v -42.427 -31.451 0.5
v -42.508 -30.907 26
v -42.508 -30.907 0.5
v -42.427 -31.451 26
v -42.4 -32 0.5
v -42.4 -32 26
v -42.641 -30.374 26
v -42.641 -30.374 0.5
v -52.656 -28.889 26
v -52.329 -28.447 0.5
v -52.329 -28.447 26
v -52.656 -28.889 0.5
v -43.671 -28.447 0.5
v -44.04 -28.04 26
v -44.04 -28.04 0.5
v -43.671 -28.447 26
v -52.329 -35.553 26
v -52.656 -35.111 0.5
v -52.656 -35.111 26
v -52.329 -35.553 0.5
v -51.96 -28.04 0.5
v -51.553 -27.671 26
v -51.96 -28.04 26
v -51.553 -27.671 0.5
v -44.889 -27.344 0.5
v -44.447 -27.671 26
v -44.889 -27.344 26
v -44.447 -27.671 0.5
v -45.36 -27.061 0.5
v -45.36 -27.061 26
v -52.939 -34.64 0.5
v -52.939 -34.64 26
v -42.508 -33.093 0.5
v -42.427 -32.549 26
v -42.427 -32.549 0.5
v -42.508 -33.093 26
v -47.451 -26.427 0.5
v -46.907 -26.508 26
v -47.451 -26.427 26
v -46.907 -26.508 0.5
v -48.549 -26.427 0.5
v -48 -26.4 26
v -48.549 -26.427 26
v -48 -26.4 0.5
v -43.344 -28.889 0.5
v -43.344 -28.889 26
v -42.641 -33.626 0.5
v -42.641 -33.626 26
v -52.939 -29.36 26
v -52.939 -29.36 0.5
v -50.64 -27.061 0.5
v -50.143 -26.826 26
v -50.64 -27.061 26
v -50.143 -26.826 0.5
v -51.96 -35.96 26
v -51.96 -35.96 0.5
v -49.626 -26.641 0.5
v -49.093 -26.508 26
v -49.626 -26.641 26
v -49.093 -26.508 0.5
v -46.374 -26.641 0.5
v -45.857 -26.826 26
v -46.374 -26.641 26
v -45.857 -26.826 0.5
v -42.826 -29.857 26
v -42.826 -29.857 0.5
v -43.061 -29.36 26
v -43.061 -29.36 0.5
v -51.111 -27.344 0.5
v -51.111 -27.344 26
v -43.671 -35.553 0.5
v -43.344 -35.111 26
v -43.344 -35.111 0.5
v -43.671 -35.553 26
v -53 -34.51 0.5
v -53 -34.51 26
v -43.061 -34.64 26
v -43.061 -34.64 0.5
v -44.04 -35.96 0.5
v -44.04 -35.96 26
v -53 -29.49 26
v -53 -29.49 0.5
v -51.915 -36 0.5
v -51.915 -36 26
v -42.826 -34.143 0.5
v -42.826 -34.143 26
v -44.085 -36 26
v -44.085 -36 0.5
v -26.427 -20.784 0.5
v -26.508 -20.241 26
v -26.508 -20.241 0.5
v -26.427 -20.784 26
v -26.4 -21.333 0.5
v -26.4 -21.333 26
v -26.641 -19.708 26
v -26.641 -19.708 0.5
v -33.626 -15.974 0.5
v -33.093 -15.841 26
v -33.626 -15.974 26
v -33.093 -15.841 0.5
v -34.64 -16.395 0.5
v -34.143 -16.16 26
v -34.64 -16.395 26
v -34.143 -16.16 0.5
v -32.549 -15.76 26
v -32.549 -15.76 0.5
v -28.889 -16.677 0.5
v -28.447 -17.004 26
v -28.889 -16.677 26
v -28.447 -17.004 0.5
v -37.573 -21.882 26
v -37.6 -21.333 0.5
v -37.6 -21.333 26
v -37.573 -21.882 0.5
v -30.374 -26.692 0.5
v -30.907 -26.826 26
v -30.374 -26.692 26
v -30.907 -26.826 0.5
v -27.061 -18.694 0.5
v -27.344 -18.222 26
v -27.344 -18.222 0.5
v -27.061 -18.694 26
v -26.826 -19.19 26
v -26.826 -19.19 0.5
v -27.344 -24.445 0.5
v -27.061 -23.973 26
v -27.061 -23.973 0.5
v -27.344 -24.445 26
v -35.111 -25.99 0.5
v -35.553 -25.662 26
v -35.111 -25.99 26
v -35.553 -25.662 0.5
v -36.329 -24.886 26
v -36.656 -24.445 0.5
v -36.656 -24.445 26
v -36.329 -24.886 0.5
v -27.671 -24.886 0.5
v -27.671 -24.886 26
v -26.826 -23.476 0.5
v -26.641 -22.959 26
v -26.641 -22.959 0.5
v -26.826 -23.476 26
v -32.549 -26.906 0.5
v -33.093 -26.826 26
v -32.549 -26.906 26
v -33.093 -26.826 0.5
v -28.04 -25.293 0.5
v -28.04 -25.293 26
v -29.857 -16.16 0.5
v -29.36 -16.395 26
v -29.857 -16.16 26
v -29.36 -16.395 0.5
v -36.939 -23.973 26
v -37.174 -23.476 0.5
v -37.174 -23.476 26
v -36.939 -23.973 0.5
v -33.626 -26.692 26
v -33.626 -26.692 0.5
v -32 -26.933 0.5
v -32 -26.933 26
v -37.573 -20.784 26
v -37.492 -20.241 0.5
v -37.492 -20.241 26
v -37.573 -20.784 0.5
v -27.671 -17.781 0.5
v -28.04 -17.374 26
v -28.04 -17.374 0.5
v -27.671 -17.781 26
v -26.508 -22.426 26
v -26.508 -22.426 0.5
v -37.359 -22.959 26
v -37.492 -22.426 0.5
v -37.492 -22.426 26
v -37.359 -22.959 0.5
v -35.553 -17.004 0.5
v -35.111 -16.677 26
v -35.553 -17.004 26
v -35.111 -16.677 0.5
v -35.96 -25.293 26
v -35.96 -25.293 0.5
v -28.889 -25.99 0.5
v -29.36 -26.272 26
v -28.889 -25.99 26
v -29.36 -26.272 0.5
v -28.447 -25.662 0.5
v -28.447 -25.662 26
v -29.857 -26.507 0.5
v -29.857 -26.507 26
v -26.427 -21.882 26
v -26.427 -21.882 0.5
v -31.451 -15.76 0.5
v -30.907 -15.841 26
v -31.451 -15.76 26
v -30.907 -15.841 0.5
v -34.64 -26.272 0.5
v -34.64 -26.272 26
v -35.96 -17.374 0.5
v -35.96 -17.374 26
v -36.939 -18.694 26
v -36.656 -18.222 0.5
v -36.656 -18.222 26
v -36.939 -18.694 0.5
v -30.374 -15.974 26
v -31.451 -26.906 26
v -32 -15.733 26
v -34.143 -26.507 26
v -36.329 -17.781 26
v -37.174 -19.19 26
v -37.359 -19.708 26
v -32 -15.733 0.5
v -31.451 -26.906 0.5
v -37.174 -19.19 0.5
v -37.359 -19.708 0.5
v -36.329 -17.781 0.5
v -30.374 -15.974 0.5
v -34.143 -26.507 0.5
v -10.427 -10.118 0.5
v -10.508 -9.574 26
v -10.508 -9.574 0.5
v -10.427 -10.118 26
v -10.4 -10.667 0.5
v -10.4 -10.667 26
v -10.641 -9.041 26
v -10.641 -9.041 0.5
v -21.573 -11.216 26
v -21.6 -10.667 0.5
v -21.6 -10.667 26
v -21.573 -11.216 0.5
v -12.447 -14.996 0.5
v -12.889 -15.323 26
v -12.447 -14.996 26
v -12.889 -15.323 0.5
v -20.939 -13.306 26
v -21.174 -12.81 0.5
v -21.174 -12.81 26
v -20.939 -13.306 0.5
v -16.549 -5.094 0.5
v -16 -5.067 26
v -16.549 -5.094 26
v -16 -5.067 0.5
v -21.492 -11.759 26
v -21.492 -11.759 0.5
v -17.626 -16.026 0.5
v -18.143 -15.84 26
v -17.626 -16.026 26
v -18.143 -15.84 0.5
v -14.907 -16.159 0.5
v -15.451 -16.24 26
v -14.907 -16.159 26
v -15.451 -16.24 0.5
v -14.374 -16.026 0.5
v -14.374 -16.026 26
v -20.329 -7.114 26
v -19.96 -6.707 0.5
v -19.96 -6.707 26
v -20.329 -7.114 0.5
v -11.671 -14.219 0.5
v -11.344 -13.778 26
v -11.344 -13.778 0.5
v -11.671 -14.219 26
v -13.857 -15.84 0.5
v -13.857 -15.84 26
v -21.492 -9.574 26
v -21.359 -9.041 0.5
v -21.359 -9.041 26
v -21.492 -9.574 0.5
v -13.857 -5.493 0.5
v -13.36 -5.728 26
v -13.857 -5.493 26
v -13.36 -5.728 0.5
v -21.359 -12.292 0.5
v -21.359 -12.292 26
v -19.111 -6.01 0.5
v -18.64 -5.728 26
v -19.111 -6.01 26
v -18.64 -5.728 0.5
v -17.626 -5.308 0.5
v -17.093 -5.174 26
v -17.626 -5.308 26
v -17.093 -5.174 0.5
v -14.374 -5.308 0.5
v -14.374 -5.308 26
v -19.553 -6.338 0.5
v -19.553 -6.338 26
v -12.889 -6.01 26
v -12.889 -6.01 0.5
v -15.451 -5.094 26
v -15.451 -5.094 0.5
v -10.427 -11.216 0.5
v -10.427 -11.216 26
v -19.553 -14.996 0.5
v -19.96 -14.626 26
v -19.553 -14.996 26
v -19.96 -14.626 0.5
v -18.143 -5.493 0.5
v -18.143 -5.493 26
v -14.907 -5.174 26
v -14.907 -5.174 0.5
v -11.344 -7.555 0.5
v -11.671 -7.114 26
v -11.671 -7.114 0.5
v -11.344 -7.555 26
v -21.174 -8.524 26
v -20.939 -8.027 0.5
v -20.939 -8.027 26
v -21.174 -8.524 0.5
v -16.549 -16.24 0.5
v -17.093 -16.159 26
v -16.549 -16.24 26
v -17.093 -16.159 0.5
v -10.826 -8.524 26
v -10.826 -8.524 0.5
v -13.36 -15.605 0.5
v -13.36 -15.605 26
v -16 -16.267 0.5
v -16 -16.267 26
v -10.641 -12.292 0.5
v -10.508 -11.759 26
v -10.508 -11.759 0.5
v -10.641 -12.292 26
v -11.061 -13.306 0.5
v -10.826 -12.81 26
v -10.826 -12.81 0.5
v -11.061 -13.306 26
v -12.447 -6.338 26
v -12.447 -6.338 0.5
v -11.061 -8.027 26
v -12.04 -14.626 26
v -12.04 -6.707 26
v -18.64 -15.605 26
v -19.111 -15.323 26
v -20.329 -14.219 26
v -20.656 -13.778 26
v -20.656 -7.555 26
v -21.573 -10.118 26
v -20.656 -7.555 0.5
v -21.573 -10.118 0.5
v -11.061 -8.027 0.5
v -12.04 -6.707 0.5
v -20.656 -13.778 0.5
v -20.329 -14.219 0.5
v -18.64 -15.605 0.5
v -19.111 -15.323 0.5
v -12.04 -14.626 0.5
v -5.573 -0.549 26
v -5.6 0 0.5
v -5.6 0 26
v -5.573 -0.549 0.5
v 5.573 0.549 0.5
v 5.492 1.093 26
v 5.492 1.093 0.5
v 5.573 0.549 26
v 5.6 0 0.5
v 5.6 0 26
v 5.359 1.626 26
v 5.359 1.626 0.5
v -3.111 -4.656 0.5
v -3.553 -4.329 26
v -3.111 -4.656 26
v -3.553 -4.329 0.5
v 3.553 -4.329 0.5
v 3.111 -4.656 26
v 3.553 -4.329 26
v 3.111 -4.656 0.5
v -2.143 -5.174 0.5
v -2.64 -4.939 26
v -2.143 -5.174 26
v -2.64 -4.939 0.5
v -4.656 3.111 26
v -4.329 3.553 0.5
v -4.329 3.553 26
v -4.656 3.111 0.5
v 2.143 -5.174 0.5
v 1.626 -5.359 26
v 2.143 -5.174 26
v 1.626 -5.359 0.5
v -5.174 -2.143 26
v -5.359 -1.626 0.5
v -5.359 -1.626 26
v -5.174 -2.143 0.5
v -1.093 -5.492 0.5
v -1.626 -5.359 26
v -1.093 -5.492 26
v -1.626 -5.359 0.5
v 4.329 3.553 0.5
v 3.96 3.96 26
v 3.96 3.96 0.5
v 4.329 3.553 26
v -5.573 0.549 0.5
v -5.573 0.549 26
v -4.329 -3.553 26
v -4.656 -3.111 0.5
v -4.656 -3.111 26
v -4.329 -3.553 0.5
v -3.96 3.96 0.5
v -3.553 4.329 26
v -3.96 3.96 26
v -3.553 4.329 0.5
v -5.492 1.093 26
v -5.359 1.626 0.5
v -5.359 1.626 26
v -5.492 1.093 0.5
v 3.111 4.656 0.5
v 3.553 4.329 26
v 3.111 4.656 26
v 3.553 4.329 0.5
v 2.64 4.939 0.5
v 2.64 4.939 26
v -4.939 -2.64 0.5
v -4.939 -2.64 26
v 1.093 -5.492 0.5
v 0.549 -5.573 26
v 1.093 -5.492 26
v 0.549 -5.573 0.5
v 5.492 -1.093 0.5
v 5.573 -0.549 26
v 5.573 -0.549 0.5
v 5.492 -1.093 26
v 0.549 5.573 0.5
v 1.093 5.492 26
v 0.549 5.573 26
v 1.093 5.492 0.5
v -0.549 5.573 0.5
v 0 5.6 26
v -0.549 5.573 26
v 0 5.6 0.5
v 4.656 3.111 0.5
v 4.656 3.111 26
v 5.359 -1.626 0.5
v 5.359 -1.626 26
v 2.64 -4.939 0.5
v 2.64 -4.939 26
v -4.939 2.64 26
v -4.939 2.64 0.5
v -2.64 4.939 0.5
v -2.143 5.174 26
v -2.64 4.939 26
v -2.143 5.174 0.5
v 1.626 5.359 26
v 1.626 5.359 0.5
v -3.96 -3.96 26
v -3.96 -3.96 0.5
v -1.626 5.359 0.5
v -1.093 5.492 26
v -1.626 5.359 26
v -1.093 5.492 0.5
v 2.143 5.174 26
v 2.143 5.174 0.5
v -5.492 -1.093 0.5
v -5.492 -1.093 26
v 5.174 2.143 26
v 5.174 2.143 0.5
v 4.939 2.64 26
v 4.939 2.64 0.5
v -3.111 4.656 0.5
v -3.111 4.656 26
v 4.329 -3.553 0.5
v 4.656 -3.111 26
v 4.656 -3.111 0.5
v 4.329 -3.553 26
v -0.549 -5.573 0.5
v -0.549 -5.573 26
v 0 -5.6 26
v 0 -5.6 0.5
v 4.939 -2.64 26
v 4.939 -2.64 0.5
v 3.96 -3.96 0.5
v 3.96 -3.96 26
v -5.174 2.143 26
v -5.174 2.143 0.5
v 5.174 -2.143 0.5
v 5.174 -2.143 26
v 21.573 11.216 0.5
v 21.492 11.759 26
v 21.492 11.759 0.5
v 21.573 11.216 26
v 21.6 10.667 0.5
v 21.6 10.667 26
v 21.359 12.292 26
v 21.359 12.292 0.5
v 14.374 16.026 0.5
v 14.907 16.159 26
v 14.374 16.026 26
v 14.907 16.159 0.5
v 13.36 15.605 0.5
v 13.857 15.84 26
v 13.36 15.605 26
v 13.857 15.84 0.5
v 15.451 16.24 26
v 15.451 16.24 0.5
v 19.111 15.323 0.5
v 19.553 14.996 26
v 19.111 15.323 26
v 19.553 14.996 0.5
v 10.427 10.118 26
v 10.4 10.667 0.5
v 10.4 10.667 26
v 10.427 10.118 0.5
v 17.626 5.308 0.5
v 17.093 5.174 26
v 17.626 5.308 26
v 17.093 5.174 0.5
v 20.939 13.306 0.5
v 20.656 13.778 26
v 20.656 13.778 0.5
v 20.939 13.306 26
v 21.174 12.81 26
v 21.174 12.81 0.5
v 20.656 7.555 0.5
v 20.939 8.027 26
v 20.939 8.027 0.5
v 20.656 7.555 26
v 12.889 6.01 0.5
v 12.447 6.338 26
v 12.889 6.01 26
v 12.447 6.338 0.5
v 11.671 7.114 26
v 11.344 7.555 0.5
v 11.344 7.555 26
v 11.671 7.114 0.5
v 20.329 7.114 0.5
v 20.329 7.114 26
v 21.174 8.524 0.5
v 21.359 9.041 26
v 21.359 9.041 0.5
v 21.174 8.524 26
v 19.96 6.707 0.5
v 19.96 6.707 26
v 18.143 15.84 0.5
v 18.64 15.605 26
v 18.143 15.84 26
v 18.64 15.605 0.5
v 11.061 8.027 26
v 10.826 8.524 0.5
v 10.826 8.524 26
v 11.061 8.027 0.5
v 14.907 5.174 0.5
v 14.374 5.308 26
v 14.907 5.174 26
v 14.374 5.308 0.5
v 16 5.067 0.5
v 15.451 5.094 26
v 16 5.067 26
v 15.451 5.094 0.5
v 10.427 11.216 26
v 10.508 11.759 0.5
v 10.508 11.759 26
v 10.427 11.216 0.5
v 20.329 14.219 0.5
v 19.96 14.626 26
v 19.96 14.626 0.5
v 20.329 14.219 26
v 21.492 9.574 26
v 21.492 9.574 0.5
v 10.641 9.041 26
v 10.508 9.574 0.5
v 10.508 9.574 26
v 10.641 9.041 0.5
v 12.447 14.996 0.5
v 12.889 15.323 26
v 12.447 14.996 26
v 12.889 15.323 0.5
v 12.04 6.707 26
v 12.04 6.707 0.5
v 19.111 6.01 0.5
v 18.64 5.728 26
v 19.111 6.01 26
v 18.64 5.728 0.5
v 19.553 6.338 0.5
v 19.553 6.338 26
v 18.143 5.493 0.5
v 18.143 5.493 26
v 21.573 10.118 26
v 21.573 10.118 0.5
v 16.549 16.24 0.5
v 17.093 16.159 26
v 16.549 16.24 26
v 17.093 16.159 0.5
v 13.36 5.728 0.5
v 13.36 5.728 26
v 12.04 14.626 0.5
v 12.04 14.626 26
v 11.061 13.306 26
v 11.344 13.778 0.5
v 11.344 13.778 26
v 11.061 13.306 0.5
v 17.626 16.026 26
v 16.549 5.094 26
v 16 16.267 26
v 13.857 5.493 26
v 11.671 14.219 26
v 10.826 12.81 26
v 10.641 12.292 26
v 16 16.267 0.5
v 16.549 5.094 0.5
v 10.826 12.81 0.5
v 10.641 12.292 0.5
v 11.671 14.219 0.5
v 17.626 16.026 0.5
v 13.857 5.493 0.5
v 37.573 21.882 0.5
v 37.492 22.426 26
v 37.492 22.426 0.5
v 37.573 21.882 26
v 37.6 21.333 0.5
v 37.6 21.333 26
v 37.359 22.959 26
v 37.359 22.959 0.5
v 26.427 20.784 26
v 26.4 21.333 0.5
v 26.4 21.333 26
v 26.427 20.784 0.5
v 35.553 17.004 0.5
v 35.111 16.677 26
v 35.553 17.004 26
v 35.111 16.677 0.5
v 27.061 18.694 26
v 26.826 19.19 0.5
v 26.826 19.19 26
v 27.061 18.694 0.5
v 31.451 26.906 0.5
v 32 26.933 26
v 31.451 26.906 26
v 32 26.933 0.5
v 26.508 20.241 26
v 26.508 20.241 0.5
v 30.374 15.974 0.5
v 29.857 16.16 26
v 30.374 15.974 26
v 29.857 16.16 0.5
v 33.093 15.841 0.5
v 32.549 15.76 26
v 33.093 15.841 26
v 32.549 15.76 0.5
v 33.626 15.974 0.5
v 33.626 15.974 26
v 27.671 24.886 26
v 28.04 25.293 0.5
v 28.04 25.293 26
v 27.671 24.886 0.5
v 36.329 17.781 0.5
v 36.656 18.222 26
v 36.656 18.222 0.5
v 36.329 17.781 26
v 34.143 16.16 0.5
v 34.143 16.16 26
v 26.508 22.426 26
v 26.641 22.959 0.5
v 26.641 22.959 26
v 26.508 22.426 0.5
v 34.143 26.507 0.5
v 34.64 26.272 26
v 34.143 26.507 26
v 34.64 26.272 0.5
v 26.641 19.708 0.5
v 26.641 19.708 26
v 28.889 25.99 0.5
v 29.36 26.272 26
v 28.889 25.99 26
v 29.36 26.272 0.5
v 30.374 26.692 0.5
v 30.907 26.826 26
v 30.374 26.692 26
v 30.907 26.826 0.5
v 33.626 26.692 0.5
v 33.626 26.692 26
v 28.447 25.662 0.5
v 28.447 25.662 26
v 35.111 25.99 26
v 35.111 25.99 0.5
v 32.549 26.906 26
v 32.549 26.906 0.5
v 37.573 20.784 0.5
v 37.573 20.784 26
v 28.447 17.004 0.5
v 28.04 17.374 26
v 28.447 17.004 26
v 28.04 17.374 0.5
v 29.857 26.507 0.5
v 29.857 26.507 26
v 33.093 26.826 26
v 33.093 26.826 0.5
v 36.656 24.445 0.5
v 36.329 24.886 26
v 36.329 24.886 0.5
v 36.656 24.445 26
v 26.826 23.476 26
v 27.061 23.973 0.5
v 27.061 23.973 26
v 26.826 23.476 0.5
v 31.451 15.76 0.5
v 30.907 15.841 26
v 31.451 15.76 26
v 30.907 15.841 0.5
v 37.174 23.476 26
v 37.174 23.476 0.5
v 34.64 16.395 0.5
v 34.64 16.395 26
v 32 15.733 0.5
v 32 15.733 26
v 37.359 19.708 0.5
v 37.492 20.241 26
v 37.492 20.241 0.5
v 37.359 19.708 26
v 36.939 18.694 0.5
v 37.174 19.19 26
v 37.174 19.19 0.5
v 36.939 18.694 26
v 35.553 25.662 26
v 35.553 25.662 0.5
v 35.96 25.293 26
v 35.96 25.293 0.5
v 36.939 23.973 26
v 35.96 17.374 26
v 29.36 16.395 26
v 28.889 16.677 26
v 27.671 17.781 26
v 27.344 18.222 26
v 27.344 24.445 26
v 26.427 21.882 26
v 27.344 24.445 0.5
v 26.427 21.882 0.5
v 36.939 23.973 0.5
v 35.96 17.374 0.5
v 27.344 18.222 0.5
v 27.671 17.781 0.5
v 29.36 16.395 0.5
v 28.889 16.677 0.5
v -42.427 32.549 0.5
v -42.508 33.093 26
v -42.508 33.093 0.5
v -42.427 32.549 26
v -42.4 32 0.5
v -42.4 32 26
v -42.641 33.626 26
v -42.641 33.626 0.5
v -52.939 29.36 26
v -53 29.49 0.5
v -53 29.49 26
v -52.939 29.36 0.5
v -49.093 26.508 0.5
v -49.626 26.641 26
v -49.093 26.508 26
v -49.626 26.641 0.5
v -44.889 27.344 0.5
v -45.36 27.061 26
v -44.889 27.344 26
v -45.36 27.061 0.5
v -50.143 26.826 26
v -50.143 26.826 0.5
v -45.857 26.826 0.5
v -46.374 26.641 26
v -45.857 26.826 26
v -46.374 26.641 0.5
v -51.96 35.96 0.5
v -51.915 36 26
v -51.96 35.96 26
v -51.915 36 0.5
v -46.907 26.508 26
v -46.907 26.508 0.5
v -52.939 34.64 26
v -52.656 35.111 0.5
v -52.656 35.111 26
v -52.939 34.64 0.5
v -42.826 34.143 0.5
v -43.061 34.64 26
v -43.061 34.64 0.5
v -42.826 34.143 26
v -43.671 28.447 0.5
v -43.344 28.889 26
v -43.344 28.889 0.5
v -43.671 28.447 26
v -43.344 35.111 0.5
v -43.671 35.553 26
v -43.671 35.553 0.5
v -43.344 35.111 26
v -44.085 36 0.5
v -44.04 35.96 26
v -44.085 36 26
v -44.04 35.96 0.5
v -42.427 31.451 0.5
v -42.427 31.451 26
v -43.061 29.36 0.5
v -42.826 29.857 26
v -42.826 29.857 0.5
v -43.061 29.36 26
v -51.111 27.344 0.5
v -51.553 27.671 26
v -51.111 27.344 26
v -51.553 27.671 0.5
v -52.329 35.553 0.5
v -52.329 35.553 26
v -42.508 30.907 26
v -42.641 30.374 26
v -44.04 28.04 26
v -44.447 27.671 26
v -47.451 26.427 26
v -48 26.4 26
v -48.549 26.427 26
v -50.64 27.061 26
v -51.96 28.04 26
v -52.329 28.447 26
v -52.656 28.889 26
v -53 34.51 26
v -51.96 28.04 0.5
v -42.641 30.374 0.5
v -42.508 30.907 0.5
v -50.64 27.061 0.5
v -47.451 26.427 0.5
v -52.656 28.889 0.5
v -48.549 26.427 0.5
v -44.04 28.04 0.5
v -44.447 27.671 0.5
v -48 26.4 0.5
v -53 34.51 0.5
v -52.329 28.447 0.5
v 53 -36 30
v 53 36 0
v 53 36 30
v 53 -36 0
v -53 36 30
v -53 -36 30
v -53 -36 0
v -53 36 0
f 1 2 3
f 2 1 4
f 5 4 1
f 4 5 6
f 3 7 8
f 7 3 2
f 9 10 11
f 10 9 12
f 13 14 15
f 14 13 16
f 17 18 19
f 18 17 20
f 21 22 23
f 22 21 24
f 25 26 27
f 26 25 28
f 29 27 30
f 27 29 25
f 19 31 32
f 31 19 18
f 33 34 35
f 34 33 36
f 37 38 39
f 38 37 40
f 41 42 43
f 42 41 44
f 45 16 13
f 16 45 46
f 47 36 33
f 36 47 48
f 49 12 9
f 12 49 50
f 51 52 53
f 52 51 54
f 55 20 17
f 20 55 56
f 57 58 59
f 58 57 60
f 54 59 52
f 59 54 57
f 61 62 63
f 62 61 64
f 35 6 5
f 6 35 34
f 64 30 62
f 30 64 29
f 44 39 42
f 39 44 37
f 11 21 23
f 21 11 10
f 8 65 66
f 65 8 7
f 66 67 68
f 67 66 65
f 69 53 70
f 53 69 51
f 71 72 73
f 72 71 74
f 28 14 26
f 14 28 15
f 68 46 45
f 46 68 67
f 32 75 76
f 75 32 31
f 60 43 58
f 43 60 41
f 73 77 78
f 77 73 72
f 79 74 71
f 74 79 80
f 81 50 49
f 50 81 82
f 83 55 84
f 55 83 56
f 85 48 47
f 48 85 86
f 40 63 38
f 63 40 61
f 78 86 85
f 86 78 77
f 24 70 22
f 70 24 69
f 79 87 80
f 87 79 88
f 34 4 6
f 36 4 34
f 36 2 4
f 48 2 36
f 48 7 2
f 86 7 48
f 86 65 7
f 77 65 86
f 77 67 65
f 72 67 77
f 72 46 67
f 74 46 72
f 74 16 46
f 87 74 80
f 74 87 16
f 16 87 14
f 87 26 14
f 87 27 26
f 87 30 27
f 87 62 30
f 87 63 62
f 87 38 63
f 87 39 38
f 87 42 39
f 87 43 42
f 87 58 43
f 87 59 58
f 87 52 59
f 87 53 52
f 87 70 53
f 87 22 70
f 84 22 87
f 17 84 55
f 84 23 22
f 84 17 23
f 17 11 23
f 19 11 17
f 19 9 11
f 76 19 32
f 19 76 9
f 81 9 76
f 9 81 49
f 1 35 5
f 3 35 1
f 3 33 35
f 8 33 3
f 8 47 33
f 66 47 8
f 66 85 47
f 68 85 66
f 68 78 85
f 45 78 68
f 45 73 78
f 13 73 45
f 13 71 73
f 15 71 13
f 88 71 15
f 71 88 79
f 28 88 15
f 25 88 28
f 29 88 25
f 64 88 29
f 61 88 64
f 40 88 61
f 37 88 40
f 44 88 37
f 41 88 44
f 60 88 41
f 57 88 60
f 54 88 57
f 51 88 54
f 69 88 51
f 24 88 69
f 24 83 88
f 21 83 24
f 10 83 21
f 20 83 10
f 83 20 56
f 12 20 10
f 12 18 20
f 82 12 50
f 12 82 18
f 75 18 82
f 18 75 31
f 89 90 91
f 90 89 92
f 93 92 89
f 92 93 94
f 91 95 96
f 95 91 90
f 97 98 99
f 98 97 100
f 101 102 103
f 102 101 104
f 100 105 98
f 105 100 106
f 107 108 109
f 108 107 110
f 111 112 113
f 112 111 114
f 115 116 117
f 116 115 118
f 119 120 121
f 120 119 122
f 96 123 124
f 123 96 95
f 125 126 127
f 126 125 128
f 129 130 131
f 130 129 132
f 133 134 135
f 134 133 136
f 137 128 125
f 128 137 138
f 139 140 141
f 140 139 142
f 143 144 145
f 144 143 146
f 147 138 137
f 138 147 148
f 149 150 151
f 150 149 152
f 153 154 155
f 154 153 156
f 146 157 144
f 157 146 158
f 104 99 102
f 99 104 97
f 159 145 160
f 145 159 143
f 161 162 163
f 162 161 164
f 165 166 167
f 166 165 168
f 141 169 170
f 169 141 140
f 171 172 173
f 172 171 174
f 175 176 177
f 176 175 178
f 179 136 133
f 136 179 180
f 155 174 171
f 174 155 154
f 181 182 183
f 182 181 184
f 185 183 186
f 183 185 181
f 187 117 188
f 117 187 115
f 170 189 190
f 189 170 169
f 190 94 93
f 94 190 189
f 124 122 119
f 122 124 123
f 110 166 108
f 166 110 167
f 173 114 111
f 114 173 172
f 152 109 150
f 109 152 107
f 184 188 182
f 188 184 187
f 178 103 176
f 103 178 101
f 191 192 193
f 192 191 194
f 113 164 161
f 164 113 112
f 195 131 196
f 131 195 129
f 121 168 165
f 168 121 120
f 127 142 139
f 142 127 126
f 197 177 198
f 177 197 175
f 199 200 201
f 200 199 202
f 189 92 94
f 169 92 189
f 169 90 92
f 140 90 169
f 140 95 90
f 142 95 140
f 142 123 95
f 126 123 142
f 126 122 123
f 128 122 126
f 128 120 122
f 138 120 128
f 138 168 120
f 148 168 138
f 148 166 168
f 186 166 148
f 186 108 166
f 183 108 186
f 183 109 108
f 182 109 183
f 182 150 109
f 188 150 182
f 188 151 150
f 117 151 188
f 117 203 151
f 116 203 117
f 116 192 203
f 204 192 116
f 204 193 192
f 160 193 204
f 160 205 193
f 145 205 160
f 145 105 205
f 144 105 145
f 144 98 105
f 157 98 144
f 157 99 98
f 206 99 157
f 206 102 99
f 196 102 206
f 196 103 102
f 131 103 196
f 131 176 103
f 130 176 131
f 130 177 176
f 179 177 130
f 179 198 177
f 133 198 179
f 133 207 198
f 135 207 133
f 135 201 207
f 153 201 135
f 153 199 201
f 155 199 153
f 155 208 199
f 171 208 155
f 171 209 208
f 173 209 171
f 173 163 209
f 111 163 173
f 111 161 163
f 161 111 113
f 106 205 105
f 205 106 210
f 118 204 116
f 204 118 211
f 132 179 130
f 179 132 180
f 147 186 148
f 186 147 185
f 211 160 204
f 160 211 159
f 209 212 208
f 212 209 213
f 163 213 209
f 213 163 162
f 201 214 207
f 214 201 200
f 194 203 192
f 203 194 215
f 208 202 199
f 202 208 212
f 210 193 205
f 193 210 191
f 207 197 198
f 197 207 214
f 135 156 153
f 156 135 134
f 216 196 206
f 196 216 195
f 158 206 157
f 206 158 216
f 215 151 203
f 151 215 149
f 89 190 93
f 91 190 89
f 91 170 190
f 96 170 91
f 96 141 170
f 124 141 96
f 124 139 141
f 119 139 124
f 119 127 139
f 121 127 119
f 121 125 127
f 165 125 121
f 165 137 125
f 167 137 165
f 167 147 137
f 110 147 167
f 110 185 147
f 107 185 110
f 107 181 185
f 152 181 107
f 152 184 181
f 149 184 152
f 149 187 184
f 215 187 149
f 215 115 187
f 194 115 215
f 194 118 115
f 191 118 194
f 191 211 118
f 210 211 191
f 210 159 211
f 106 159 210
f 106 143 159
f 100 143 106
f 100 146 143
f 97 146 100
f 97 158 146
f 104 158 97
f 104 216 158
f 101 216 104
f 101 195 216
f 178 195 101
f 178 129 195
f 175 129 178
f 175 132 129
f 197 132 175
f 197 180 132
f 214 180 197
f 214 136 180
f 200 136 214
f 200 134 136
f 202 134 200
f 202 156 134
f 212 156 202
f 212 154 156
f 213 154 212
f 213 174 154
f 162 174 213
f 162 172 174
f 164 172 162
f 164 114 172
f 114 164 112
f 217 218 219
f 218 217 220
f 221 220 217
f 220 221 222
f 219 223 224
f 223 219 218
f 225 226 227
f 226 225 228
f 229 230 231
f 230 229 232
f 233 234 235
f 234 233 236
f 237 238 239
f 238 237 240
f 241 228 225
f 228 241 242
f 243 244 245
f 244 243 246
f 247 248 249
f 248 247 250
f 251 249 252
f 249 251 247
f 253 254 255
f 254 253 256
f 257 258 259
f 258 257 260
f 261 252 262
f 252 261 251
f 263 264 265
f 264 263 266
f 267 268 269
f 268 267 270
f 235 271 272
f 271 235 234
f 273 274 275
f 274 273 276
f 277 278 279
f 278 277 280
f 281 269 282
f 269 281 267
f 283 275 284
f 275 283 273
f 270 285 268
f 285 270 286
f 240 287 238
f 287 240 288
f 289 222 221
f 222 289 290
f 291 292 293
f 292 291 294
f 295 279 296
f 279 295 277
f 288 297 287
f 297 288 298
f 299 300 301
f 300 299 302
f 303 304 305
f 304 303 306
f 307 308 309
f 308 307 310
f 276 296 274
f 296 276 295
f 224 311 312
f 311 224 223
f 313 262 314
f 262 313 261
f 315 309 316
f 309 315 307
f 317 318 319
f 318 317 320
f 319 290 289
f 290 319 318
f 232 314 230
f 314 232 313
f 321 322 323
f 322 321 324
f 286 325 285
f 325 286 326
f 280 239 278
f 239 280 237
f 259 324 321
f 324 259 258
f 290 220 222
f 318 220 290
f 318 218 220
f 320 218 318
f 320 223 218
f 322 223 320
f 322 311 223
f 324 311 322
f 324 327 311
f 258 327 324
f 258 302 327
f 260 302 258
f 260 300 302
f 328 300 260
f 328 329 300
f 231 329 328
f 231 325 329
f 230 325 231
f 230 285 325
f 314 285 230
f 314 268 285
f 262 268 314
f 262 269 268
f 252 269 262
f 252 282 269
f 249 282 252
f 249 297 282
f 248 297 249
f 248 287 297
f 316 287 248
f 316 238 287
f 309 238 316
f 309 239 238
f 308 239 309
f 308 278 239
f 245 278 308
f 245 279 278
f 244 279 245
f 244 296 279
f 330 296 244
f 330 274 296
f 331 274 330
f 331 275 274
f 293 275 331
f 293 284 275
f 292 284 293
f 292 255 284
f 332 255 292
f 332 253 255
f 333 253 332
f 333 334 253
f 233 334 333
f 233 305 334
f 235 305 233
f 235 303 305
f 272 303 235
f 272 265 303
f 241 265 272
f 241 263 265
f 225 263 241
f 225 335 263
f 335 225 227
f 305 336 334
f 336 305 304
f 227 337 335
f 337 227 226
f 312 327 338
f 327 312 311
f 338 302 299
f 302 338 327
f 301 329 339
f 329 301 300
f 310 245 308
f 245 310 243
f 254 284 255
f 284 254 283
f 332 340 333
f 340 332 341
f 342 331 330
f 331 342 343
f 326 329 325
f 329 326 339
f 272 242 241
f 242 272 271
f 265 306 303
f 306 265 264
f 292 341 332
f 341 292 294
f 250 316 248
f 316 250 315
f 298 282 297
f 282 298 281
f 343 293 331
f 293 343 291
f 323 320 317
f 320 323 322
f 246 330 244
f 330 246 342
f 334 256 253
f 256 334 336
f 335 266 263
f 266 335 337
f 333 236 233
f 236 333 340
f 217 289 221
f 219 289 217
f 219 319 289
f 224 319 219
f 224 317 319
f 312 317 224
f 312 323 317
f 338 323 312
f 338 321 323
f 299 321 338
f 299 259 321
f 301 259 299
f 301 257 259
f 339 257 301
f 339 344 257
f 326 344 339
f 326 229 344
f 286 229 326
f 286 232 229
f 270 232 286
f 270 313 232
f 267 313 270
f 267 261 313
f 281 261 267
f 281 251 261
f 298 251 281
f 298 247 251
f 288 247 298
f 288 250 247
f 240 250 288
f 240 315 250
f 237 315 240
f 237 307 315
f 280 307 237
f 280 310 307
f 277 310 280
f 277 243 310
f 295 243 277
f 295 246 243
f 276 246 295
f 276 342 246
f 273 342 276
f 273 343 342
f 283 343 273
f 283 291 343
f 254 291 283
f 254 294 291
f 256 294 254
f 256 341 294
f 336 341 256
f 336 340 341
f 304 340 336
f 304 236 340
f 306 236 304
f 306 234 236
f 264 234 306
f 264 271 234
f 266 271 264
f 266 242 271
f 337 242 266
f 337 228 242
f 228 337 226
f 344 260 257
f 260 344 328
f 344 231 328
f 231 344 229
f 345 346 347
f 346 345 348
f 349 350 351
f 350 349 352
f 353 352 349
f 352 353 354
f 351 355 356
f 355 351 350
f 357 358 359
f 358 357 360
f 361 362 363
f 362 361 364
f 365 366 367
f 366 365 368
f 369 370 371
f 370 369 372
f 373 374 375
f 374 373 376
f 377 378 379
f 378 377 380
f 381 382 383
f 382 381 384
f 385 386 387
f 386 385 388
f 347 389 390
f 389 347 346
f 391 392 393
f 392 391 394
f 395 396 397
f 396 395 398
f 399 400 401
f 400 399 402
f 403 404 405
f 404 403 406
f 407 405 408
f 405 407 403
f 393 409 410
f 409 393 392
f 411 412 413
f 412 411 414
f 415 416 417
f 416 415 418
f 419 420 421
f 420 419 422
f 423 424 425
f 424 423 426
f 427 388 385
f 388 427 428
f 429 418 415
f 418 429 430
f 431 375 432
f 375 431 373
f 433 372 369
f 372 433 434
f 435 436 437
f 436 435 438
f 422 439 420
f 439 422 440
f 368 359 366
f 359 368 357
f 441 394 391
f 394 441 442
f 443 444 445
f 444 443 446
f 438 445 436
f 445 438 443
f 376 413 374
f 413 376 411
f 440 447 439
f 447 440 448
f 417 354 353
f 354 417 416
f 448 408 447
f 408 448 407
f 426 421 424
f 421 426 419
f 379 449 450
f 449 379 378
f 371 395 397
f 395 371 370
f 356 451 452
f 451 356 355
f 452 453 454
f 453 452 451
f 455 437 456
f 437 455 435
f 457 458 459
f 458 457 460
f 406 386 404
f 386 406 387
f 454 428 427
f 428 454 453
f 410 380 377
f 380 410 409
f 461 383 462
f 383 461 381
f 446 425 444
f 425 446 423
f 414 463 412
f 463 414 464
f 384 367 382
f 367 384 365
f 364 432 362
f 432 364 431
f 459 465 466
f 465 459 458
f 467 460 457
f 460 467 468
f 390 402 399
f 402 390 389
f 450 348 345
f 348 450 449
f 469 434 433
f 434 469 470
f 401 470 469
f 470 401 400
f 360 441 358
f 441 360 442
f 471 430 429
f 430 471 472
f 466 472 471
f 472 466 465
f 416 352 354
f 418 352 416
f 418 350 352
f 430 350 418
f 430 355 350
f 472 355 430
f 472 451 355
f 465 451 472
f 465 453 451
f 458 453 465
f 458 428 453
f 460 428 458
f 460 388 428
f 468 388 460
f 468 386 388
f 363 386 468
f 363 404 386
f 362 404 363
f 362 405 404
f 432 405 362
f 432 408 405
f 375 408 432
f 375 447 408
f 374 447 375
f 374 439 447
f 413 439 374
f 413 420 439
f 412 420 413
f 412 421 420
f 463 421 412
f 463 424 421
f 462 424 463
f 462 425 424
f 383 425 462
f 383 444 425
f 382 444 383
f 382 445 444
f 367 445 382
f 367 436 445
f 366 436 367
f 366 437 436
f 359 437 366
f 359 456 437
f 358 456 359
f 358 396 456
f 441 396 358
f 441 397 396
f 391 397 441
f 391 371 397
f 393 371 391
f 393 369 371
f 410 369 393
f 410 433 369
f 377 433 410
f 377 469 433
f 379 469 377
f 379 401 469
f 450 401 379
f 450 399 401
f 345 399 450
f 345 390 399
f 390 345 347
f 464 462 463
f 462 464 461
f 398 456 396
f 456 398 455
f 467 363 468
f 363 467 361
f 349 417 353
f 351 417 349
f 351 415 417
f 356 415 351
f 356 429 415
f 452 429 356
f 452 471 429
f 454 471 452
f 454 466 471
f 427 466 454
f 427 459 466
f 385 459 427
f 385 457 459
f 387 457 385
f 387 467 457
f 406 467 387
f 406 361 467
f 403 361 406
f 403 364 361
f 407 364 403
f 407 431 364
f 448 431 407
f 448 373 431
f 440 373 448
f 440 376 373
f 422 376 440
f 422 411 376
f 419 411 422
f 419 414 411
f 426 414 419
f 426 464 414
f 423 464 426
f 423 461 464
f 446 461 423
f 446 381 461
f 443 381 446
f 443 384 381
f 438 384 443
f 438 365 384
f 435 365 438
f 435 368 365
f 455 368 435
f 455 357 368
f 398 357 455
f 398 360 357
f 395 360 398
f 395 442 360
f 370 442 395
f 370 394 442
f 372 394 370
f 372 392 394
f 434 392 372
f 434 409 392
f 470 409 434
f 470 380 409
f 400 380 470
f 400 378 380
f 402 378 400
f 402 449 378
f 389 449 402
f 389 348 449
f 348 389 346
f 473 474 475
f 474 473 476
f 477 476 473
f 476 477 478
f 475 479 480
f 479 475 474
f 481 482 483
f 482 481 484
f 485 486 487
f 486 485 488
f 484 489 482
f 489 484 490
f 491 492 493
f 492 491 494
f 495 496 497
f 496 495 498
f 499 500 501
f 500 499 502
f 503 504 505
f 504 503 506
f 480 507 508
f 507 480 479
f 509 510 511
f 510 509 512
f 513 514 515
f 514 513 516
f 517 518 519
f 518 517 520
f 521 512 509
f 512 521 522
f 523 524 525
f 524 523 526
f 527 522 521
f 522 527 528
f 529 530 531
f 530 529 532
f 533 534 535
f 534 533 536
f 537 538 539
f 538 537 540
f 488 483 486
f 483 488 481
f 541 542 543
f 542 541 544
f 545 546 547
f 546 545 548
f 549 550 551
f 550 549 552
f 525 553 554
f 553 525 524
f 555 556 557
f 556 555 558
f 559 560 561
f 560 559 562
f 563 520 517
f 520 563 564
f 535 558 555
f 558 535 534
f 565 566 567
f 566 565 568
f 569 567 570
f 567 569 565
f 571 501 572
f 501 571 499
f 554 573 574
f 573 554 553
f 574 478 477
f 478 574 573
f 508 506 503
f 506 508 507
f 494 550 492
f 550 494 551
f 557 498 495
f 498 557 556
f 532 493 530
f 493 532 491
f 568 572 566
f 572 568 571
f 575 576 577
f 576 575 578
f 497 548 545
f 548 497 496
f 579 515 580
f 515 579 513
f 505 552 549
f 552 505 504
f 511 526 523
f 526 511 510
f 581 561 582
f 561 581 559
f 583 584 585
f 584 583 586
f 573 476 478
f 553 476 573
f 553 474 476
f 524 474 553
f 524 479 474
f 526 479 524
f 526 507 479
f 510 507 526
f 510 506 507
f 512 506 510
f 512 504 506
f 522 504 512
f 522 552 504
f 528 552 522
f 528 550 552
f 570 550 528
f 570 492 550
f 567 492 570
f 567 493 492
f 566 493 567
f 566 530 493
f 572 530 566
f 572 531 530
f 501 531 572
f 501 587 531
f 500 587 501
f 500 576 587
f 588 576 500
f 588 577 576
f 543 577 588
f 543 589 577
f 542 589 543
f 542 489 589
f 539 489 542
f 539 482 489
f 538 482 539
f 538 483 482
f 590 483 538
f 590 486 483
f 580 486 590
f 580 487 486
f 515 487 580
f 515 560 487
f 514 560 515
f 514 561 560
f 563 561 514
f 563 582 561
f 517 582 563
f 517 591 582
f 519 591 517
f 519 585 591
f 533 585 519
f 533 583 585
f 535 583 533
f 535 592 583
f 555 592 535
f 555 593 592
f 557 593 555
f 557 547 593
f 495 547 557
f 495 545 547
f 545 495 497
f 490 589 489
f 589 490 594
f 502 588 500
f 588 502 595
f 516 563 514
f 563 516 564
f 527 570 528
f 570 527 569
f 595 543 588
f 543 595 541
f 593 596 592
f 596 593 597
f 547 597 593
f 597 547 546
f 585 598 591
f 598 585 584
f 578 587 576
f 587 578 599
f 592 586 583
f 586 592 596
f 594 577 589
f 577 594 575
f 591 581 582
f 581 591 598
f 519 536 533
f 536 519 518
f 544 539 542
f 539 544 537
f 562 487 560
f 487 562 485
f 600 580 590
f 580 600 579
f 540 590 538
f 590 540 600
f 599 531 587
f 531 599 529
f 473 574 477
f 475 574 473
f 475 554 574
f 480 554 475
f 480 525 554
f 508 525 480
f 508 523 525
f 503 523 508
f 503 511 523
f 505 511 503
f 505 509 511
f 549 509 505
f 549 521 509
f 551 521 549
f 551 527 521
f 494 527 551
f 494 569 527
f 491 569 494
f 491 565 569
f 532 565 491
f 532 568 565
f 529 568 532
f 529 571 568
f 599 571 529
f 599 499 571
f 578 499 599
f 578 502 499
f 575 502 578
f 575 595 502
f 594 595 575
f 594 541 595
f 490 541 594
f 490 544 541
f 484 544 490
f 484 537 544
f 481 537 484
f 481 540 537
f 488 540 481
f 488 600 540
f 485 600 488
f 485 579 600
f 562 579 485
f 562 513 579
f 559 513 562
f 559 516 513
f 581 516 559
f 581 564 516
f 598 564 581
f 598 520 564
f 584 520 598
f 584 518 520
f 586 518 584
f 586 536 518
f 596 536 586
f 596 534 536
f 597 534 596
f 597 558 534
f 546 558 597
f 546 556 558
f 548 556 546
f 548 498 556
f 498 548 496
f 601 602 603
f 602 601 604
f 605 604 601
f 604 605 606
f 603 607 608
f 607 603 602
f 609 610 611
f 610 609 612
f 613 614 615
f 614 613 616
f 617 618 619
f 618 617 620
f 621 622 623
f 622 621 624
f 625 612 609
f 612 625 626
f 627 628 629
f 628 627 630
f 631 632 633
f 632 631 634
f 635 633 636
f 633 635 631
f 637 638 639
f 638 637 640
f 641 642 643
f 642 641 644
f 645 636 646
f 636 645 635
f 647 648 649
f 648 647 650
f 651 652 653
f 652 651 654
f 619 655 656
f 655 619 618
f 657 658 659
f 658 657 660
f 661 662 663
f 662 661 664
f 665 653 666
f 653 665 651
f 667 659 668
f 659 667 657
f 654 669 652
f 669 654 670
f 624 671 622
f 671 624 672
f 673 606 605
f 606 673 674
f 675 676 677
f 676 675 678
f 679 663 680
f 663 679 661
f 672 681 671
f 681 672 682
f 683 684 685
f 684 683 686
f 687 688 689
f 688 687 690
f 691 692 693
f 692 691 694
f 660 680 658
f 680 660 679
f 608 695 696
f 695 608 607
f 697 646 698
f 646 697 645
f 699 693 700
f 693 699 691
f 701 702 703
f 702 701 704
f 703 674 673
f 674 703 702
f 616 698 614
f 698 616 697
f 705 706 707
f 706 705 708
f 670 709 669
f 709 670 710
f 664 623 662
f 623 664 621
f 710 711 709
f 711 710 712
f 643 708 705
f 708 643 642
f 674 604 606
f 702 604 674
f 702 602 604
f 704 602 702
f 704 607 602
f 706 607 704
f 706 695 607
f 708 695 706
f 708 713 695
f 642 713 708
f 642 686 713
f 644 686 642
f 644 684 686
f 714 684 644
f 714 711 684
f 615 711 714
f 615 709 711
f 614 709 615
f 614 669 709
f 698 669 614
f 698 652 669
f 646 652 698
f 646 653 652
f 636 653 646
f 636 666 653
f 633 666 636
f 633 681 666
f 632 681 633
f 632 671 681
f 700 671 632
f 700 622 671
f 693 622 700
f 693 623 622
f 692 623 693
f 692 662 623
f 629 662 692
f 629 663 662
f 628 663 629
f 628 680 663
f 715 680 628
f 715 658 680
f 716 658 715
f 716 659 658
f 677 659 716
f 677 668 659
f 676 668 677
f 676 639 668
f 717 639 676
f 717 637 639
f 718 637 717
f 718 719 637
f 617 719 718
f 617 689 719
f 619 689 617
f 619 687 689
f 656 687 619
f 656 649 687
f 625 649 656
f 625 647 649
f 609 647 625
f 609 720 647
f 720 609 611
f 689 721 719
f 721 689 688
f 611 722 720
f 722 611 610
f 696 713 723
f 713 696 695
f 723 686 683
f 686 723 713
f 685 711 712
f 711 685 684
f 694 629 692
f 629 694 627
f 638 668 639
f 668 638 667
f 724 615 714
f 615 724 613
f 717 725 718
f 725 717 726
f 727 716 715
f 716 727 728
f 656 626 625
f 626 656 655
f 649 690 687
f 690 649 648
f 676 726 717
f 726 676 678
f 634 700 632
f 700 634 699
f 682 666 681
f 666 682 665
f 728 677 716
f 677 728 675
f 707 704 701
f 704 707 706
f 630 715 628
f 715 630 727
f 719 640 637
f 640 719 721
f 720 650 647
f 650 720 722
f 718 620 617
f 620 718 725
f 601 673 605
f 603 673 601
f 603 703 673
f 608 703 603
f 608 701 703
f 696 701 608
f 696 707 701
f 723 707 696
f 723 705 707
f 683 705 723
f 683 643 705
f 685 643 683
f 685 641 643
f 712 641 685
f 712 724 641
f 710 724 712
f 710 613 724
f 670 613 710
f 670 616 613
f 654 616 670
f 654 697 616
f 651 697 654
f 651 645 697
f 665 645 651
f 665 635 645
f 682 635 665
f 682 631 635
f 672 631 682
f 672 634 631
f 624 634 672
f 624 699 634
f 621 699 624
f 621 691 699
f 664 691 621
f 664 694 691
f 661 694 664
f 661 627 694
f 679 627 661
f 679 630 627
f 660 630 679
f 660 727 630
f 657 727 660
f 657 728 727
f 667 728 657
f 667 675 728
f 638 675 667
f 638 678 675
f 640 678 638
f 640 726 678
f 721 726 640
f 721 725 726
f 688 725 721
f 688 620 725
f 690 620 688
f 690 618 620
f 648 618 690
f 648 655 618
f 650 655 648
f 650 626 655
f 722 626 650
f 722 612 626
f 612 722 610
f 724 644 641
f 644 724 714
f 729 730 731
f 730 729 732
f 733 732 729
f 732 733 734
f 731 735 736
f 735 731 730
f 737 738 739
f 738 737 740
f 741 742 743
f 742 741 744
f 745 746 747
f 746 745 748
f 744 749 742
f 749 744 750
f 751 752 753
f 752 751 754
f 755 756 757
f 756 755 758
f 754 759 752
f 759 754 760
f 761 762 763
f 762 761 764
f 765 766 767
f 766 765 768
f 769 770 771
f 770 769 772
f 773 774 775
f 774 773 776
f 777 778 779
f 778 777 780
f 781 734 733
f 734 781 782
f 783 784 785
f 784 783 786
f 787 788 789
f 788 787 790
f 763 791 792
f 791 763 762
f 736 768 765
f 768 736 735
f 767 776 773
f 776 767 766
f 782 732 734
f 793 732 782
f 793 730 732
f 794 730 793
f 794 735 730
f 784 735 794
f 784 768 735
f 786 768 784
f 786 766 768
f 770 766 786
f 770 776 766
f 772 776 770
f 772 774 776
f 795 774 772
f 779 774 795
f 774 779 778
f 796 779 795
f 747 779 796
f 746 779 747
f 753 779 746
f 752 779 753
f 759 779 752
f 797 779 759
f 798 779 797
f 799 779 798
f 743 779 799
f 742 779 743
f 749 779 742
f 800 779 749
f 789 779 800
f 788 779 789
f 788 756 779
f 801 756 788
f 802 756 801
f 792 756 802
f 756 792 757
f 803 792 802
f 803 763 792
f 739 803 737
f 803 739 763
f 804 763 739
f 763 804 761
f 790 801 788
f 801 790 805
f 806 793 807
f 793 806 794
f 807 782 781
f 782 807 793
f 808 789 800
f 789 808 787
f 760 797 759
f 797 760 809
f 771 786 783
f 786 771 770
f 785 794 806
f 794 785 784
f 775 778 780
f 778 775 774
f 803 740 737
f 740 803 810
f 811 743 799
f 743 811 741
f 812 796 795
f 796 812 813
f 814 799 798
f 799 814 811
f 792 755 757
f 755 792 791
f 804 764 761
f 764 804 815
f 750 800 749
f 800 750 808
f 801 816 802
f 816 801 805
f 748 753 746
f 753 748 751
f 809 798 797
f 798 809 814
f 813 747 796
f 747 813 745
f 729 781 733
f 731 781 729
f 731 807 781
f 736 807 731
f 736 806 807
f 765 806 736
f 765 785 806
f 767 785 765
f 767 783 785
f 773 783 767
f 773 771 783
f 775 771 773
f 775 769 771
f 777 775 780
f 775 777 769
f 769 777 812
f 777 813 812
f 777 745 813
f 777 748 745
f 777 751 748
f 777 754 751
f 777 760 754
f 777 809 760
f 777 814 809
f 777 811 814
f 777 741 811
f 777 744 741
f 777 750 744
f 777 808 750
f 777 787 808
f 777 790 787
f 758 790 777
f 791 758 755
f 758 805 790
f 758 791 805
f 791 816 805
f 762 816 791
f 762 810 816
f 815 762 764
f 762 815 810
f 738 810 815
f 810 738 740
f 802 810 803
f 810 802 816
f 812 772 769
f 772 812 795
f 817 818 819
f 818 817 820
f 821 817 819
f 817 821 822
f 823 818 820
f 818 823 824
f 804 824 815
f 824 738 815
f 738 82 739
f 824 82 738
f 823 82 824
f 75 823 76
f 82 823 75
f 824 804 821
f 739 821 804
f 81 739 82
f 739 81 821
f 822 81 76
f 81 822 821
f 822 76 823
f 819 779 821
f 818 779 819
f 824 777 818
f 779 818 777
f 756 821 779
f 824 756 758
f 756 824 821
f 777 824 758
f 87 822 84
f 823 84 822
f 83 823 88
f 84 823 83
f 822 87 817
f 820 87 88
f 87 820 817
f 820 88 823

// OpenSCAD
// Bench rack for 1.5 mL microcentrifuge tubes
// Print orientation: base on XY plane, holes open at the top

// ---- Block dimensions ----
block_len   = 106;   // block length along X (mm)
block_wid   = 72;    // block width along Y (mm)
block_ht    = 30;    // block height along Z (mm)

// ---- Hole dimensions ----
hole_d      = 11.2;  // hole diameter (mm)
hole_depth  = 25;    // hole depth from top surface (mm)
hole_pitch  = 16;    // centre-to-centre spacing in X and Y (mm)
hole_count  = 24;    // total number of holes (4 rows x 6 holes)

// ---- Derived ----
floor_t     = block_ht - hole_depth;  // solid floor thickness = 5 mm
overcut     = 0.5;                     // extension past top face for clean cut

$fn = 64;

difference() {
    // Main block
    translate([-block_len/2, -block_wid/2, 0])
        cube([block_len, block_wid, block_ht]);

    // Hole grid, centred on the block
    for (i = [0 : hole_count - 1]) {
        x = (i % 6)     * hole_pitch - 3 * hole_pitch;   // 6 holes along X
        y = (i / 6) * 4 * hole_pitch - 2 * hole_pitch;   // 4 rows along Y
        translate([x, y, overcut])
            cylinder(d = hole_d, h = hole_depth + overcut);
    }
}
